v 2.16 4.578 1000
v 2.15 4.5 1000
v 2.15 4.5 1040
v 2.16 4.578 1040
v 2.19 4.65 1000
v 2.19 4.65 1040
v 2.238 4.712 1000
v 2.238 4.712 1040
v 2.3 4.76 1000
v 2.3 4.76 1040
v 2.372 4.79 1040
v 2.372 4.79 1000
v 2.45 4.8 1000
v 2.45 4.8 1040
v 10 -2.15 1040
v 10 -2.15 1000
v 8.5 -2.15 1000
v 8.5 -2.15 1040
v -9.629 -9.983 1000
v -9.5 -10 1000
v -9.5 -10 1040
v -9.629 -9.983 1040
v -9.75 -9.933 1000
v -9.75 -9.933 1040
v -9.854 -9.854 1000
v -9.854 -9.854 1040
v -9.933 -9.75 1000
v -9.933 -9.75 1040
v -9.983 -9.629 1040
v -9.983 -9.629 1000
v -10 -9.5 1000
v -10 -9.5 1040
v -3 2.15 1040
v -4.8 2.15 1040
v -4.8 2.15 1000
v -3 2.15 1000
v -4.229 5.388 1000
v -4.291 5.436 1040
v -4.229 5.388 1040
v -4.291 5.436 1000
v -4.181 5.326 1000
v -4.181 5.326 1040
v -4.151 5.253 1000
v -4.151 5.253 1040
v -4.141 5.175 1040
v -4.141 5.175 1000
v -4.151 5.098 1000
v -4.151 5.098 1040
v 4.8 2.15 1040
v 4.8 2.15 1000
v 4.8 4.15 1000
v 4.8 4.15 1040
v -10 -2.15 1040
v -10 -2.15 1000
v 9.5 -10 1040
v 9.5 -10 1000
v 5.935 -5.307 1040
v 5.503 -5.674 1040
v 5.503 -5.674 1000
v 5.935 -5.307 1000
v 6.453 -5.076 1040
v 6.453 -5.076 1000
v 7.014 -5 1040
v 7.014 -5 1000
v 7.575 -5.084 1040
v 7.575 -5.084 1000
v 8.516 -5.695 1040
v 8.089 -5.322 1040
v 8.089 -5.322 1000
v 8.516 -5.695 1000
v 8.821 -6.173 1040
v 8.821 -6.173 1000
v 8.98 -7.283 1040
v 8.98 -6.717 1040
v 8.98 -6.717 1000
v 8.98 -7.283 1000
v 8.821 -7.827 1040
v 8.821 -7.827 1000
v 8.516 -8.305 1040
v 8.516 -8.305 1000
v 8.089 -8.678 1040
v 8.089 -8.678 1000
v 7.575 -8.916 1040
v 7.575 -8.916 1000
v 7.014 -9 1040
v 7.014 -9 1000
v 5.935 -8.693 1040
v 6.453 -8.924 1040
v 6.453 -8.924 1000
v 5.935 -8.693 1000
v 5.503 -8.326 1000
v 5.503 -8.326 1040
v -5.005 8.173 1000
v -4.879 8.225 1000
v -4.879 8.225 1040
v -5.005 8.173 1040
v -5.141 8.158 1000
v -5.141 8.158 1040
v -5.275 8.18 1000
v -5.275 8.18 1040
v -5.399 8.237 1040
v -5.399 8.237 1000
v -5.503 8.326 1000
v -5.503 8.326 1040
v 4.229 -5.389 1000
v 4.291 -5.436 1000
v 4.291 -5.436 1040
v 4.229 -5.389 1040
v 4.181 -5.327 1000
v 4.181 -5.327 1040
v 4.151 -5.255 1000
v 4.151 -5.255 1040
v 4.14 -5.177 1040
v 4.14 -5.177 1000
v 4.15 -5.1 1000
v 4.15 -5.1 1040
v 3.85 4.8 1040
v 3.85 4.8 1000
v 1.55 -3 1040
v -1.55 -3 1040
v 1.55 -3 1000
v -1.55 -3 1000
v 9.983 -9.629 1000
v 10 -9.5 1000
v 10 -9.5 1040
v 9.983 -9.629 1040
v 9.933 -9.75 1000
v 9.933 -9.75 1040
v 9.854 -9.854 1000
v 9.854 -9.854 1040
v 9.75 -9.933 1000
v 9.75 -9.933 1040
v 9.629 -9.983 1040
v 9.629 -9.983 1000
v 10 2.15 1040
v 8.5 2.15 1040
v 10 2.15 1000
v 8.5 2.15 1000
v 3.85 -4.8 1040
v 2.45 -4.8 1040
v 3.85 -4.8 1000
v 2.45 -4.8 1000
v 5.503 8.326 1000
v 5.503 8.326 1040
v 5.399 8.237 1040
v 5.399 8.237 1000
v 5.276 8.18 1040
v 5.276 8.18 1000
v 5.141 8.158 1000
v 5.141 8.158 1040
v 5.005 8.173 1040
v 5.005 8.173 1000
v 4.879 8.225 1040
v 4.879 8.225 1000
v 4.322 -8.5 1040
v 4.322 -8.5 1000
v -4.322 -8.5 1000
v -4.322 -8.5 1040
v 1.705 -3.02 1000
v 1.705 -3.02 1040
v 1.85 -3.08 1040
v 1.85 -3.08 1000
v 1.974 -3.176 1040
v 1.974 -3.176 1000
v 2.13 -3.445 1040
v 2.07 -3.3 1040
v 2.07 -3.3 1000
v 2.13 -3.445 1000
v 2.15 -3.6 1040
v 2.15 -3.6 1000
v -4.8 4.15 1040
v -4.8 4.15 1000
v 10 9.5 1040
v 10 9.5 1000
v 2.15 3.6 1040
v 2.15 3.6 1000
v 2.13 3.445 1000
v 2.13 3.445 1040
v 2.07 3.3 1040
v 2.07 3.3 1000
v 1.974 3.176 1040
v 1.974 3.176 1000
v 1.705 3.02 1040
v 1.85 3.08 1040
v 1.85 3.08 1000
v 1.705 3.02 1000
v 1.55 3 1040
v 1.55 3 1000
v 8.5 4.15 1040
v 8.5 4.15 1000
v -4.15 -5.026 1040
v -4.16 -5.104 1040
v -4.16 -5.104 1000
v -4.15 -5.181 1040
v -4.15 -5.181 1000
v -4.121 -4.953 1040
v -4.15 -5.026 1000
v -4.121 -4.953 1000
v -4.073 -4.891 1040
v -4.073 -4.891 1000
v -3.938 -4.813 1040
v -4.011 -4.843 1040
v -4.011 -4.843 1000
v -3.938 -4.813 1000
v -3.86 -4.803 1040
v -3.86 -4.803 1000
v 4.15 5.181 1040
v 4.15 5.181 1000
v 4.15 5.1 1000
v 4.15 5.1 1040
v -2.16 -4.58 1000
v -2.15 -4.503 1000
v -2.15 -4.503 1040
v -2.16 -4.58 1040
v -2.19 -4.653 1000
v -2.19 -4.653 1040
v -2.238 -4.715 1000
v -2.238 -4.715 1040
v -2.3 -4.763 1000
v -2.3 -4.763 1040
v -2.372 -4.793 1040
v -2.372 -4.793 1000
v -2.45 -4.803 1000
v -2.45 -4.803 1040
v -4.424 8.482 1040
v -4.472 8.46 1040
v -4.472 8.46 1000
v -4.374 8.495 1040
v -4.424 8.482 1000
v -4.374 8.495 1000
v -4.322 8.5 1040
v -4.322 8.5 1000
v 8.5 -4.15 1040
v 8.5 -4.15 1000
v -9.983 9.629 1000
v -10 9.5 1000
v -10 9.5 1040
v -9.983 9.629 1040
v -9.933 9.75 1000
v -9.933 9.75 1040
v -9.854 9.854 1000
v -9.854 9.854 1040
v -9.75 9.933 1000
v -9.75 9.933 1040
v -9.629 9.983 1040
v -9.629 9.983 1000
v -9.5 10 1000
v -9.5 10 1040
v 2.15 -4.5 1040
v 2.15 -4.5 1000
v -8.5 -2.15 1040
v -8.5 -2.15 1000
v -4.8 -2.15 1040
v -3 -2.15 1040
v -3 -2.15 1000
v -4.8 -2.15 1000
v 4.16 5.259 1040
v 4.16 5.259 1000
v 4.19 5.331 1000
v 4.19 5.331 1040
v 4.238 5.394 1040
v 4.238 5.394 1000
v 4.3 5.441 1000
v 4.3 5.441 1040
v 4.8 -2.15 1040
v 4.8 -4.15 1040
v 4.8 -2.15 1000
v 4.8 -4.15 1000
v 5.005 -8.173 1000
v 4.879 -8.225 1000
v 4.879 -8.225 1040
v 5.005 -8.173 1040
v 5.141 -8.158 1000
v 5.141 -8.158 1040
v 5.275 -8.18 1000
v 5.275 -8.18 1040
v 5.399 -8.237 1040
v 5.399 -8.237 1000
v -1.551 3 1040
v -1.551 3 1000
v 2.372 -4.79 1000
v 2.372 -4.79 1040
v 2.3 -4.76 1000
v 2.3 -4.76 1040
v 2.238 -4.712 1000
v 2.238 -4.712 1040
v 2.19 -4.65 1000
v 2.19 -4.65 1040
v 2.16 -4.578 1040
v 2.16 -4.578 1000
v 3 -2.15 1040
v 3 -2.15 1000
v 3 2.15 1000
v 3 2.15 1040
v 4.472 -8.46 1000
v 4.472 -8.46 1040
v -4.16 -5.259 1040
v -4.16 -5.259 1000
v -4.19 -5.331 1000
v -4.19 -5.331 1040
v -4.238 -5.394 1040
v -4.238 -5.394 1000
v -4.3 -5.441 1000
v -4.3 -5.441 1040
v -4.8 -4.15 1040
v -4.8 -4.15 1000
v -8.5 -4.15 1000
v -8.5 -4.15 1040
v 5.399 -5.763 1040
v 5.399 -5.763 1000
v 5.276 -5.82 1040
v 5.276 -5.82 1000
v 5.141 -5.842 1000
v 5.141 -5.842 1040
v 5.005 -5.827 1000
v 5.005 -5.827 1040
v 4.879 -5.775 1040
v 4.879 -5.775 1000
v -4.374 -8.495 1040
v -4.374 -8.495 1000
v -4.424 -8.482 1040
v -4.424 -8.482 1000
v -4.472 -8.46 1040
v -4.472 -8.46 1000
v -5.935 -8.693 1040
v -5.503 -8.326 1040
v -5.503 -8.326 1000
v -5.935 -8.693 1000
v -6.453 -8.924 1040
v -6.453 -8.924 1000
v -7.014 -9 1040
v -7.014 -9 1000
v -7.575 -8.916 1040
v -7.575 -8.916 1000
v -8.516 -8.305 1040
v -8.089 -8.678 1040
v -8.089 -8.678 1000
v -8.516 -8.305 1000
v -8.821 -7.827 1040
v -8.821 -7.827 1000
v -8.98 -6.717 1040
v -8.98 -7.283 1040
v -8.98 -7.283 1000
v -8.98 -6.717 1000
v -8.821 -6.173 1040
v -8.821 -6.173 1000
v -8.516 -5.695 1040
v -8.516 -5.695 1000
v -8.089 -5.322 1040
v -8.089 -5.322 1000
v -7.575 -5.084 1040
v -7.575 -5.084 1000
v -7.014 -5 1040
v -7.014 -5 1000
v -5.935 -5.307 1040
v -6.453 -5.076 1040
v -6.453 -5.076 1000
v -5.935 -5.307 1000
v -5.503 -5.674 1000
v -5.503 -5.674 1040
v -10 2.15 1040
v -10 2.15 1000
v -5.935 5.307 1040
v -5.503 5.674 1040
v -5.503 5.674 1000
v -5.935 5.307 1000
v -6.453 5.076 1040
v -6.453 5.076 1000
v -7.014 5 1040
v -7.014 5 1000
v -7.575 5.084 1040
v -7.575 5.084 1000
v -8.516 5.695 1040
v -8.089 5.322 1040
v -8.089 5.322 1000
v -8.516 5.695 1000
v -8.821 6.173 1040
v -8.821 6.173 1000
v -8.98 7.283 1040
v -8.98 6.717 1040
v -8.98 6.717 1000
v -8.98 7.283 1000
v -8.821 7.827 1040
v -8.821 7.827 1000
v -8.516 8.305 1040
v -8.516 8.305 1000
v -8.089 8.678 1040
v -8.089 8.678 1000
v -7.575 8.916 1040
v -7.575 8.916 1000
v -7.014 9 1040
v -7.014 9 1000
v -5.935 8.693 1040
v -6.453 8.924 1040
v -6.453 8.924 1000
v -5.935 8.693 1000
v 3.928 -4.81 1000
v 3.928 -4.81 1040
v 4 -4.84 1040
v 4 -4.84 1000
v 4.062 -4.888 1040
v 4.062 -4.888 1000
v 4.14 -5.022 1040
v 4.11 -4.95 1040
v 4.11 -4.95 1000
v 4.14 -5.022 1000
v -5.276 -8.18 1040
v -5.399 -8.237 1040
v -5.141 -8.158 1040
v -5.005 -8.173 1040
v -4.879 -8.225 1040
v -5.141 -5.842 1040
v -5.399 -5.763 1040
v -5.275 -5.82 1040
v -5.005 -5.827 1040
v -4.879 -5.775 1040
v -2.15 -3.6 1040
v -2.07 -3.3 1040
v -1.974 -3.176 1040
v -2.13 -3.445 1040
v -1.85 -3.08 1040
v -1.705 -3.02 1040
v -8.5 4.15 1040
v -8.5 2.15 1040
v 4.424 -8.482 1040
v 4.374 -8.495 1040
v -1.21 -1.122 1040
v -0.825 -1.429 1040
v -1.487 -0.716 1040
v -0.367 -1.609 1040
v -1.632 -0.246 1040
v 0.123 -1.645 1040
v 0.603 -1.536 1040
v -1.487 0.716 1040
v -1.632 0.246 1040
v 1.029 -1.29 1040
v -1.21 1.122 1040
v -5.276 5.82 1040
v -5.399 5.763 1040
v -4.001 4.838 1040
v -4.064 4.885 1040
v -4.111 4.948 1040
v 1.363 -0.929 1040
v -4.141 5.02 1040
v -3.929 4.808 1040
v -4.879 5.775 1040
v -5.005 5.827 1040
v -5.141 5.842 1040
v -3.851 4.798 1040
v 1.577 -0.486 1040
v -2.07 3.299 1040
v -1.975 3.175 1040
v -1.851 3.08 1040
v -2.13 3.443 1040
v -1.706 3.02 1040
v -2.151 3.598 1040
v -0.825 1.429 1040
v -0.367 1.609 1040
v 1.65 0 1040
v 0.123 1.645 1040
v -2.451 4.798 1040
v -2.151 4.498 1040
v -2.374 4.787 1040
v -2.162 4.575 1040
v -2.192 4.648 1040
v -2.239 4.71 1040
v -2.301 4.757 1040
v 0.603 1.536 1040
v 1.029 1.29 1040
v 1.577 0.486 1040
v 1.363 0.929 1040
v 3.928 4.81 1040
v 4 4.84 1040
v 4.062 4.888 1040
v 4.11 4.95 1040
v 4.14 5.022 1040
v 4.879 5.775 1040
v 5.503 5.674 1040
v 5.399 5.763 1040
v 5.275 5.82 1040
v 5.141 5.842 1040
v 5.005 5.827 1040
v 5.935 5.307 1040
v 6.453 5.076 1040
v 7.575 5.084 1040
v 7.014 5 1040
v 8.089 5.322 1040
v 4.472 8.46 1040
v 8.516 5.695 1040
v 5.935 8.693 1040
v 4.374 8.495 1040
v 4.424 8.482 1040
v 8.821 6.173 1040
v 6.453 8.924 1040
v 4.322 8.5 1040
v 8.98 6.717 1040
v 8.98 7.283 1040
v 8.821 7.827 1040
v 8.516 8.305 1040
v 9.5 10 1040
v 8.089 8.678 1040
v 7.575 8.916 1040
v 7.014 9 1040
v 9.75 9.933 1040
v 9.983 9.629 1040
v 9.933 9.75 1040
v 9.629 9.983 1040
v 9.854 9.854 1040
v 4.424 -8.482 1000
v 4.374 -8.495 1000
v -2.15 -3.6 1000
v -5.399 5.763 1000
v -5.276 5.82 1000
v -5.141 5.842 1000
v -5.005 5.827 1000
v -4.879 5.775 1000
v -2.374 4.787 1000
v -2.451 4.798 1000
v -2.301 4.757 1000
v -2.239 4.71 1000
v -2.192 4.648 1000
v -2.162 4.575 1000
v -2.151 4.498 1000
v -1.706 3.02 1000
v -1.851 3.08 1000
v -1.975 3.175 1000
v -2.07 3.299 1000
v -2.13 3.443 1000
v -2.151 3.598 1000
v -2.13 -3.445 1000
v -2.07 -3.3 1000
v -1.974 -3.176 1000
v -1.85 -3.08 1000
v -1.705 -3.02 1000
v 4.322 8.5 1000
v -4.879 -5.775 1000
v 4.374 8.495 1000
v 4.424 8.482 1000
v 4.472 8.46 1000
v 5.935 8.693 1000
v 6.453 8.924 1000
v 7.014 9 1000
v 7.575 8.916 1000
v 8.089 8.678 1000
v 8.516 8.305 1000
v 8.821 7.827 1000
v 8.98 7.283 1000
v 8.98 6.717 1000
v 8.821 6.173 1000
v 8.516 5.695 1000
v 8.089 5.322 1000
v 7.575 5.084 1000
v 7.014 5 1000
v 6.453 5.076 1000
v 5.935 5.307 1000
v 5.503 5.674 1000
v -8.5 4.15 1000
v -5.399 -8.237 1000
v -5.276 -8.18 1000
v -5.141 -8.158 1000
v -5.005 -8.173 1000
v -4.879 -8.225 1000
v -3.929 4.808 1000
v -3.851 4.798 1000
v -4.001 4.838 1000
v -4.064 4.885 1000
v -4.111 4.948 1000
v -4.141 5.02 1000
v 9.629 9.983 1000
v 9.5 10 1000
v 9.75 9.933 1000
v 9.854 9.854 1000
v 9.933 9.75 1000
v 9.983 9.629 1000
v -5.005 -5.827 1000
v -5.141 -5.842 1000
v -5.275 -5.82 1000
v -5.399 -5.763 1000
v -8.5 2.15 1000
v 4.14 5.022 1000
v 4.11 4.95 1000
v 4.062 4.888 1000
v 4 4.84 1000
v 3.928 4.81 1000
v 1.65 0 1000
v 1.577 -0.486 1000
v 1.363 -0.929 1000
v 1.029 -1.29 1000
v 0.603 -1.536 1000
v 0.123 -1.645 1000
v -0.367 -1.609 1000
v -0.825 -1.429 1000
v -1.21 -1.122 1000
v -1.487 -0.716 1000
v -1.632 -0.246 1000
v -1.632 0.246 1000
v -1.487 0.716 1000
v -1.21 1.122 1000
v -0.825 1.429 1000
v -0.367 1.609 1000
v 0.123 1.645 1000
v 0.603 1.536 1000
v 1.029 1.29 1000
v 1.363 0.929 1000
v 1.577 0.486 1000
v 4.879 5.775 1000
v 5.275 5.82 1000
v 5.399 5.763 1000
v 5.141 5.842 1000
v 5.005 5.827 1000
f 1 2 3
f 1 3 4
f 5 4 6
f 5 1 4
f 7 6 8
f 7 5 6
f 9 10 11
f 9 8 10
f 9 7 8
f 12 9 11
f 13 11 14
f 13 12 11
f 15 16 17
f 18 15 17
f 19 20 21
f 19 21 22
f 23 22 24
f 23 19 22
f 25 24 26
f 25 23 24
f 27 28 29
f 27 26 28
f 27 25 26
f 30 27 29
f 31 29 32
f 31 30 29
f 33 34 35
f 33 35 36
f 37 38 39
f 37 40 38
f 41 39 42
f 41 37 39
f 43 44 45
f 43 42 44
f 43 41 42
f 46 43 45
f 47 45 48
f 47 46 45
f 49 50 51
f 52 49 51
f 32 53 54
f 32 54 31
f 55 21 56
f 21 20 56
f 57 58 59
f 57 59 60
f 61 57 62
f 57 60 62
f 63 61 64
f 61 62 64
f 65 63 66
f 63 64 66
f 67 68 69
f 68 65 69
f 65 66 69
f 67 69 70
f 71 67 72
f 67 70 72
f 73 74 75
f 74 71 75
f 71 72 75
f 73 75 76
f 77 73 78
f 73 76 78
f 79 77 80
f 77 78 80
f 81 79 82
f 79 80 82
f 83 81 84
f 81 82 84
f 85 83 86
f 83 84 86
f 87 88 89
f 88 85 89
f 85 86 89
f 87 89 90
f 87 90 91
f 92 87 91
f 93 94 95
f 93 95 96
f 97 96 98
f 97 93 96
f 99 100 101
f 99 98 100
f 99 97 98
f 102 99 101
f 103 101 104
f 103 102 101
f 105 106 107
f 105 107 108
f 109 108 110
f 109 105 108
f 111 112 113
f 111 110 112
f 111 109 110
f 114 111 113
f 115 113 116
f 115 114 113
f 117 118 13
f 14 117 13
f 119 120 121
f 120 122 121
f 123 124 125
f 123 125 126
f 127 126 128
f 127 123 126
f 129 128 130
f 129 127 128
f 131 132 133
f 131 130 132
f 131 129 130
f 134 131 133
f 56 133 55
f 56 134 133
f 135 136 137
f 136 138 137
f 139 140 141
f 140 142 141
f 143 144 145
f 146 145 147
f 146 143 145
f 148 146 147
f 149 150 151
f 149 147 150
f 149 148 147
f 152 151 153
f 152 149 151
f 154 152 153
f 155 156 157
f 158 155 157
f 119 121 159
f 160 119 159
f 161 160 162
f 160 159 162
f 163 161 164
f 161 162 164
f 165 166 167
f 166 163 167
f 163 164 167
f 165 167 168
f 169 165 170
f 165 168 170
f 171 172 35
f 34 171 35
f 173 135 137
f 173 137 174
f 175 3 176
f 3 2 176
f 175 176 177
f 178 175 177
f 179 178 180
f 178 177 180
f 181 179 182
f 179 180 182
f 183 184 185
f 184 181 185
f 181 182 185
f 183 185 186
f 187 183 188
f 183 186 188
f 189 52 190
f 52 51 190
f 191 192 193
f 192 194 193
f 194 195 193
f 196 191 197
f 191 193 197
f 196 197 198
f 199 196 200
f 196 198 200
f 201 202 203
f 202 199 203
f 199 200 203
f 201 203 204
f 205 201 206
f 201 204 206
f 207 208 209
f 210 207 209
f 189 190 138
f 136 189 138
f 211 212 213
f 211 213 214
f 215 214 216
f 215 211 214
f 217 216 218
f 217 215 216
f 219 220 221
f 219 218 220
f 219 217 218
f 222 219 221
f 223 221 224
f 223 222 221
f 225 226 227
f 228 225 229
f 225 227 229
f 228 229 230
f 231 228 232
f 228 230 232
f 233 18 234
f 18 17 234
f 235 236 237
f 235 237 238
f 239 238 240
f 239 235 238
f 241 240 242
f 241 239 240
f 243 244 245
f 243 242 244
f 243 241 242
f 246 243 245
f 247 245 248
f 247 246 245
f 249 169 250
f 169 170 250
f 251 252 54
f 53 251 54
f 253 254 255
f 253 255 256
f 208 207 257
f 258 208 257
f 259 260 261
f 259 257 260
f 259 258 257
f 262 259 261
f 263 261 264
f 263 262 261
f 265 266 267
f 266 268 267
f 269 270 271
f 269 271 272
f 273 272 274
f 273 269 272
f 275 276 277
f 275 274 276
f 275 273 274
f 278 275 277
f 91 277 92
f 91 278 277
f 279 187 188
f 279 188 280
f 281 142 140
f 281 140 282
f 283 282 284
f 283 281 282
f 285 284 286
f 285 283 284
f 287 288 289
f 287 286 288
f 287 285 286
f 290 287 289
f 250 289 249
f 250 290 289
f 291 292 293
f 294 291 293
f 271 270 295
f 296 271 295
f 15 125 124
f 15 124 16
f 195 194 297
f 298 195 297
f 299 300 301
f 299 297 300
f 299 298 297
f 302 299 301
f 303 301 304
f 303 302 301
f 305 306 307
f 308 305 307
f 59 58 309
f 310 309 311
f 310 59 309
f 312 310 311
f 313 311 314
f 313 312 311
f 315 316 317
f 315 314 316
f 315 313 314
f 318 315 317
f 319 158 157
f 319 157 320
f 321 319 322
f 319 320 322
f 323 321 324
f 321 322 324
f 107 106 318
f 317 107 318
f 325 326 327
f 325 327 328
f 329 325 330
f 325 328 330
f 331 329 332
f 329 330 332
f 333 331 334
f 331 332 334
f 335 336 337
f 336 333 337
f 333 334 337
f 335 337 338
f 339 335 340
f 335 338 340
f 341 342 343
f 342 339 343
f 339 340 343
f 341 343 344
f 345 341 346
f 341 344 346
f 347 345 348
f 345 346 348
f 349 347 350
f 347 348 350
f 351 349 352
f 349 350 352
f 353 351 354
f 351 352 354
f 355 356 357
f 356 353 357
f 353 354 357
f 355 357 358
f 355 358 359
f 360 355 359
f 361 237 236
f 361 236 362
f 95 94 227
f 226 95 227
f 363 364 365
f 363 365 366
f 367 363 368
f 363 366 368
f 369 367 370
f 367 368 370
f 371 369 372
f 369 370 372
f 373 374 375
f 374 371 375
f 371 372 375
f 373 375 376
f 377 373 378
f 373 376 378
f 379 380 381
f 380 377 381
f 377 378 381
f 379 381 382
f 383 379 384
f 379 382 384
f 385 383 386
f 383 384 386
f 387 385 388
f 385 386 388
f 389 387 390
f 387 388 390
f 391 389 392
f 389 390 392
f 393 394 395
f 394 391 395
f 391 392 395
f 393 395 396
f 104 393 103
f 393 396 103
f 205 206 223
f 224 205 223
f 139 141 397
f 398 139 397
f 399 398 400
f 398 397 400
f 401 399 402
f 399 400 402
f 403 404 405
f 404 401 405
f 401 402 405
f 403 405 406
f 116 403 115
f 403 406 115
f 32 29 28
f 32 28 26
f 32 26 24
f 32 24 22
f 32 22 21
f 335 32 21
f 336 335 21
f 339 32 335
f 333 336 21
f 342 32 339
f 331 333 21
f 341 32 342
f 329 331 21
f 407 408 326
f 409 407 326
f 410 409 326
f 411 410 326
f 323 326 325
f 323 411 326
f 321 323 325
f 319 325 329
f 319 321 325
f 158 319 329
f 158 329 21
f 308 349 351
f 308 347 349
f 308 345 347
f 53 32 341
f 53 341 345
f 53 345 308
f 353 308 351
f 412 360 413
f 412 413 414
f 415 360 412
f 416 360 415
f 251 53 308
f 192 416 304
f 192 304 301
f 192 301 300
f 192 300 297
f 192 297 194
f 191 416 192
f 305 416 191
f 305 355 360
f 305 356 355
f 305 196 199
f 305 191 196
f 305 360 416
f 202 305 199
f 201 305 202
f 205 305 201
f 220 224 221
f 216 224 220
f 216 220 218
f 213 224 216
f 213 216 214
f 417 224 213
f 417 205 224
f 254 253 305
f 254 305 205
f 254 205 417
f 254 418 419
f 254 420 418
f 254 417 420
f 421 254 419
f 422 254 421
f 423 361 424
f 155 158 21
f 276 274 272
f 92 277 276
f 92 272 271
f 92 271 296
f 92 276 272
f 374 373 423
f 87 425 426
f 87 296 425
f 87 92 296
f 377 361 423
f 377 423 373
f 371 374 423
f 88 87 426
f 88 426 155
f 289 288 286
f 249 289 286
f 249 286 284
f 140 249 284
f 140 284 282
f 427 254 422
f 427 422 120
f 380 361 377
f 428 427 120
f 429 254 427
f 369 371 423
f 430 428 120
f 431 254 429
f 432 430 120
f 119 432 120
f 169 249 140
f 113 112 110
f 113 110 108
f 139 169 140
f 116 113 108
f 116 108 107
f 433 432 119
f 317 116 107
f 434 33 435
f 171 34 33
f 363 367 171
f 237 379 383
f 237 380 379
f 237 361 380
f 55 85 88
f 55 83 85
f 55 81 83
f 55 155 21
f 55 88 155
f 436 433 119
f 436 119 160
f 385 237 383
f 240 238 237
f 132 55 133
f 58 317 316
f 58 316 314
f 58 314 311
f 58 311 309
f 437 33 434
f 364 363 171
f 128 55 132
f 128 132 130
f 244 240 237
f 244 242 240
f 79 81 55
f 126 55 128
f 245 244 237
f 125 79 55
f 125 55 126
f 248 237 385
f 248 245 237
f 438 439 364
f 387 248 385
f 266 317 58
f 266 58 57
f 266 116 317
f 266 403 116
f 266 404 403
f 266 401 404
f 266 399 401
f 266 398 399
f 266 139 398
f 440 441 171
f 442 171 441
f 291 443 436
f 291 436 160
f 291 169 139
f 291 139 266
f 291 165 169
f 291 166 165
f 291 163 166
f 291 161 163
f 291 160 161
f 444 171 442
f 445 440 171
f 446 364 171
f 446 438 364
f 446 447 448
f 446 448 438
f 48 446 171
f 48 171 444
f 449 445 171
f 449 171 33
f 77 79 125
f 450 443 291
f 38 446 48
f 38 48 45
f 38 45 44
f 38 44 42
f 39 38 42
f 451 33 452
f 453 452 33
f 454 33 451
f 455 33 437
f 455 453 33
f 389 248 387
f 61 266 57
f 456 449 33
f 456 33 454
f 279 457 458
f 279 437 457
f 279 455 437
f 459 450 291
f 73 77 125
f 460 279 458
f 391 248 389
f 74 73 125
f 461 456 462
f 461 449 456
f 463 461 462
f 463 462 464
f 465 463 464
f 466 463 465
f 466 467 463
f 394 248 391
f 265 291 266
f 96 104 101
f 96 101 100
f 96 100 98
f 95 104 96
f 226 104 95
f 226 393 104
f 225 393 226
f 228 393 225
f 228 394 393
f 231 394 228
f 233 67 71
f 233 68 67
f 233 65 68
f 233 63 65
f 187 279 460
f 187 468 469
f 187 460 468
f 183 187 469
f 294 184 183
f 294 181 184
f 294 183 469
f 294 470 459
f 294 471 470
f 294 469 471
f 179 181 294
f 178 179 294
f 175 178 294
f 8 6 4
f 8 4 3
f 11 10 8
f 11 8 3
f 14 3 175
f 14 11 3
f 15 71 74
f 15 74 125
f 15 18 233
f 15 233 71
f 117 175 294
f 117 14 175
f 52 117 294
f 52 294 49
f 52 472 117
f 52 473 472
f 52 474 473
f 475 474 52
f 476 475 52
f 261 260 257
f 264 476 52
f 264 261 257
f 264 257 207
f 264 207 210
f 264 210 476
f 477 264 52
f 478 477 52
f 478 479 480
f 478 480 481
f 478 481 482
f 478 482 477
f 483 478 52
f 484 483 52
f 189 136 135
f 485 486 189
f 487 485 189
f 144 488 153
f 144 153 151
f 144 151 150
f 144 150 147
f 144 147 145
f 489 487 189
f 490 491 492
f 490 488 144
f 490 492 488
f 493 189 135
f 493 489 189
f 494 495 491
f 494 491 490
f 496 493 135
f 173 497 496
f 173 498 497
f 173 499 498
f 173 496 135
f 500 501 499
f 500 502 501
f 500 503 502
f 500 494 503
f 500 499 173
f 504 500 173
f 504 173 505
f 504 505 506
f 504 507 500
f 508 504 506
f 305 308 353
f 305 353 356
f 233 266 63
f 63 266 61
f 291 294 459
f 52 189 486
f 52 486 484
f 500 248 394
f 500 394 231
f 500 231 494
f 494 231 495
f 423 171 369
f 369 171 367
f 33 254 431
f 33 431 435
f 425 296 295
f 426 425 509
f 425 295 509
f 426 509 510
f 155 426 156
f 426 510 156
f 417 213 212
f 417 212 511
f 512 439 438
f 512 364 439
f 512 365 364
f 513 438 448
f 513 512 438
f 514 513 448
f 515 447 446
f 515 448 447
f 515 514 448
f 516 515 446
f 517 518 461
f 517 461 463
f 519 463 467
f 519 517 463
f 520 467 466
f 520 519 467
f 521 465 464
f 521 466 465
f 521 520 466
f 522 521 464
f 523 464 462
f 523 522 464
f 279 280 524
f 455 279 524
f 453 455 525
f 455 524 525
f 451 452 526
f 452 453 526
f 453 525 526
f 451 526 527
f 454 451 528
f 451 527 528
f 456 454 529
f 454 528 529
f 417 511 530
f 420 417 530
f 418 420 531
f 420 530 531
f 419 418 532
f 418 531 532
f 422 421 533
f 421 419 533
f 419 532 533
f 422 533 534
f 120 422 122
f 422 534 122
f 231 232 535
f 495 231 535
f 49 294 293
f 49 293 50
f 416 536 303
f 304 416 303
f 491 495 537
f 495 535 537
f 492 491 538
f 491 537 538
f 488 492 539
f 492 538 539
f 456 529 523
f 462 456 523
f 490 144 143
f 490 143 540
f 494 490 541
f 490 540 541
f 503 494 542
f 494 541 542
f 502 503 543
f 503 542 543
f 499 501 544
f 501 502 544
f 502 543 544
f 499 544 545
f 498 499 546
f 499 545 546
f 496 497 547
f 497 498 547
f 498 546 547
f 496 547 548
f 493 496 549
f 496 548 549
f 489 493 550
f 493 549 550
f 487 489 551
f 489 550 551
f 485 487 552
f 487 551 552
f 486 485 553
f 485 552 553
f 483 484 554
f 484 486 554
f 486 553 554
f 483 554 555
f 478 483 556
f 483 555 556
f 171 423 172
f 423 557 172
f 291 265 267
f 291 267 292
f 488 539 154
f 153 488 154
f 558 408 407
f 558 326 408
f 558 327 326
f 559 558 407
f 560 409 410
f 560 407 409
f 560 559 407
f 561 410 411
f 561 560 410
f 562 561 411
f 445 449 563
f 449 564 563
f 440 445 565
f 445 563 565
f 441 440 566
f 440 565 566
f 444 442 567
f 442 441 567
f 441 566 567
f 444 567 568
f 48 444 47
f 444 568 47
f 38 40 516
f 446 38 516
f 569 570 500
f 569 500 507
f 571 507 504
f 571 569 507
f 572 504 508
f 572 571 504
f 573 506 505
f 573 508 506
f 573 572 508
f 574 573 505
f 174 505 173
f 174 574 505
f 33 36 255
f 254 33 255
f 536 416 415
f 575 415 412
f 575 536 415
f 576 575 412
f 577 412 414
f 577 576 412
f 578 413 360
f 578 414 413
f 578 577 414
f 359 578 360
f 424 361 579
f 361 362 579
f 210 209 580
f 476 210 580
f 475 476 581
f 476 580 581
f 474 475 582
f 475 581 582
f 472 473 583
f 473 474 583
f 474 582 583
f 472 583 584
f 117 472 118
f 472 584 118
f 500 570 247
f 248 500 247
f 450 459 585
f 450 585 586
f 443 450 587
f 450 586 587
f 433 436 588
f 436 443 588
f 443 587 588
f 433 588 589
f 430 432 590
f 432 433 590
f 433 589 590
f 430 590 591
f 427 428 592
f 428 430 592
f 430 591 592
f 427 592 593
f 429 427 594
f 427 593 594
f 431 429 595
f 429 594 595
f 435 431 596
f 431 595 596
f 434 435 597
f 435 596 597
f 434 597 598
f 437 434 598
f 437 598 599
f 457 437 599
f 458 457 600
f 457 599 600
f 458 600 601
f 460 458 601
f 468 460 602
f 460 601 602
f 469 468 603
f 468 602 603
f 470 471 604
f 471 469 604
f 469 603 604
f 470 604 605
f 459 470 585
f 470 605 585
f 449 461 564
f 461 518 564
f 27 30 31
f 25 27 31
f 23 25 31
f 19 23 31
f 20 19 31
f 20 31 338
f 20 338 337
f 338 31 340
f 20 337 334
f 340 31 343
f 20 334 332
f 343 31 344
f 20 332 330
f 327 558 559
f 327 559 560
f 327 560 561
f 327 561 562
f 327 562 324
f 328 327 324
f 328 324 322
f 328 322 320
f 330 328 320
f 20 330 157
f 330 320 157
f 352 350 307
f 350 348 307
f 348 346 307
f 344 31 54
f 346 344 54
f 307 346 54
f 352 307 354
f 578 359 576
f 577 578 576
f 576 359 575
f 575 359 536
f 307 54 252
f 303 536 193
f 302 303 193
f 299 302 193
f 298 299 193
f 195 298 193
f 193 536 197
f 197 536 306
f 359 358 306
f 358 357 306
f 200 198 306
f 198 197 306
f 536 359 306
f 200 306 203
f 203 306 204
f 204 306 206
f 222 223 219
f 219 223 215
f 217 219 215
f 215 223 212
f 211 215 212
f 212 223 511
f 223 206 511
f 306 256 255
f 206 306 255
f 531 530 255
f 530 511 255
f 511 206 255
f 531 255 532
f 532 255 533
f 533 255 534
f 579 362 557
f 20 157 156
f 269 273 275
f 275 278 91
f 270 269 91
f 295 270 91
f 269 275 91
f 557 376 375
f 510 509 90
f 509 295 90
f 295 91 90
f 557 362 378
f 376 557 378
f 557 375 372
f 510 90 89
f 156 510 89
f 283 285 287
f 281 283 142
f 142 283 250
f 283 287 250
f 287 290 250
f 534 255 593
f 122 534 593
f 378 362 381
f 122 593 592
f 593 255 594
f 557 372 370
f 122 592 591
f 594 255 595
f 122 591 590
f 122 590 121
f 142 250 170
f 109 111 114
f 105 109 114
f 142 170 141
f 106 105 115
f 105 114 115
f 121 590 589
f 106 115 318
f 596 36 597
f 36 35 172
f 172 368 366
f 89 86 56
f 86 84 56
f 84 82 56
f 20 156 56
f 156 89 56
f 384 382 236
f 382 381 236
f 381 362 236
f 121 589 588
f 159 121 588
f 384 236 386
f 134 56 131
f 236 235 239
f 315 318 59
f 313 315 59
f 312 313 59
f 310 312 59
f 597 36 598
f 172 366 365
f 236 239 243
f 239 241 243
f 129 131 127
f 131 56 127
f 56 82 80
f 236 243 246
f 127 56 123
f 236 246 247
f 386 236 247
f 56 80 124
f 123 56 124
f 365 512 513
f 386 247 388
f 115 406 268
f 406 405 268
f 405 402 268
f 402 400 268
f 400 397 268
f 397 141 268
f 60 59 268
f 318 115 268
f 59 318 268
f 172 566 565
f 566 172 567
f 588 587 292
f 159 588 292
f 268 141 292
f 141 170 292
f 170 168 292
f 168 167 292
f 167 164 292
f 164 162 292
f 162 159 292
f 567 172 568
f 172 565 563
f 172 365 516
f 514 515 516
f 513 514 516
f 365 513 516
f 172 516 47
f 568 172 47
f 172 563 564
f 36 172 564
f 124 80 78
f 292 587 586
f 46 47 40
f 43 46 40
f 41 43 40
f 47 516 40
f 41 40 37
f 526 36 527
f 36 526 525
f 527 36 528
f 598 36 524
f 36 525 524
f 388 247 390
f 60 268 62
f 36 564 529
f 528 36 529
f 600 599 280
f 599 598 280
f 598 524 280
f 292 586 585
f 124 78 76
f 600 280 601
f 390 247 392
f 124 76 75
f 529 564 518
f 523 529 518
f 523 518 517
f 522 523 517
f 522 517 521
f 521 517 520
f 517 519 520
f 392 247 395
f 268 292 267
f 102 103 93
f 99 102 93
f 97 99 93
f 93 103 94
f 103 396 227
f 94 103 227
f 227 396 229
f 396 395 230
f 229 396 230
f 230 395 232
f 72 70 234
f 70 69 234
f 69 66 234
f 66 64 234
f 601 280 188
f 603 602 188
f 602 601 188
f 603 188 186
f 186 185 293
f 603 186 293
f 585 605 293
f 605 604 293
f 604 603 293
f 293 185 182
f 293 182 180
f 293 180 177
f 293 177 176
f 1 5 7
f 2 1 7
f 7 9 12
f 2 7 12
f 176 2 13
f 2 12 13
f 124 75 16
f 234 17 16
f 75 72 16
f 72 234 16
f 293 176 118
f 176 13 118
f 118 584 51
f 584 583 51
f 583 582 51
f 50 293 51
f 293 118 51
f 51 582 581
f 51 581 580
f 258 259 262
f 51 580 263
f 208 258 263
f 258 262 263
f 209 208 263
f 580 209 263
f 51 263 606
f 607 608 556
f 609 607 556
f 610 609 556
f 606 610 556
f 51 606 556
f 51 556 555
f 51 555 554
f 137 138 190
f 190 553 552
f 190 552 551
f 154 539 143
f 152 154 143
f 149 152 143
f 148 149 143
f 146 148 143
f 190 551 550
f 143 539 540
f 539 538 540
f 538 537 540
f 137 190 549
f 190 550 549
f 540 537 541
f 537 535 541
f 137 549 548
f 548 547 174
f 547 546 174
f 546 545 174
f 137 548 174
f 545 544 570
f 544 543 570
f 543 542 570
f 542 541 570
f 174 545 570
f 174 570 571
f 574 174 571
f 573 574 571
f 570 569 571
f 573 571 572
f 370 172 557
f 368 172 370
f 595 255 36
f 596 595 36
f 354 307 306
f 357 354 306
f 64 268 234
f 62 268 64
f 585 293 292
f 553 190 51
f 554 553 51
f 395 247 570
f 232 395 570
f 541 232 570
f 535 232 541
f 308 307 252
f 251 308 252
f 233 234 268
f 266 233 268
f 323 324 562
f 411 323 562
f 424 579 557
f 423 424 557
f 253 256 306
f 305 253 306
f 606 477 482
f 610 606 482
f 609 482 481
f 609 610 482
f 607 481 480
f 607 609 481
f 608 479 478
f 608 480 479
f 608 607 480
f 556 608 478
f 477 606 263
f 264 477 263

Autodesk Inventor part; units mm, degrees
ref_plane "YZ Plane" through (0, 0, 0) normal (1, 0, 0) x (0, 1, 0)
ref_plane "XZ Plane" through (0, 0, 0) normal (0, 1, 0) x (-1, 0, 0)
ref_plane "作業平面1" through (-9.5, -10, 1000) normal (0, 0, 1) x (1, 0, 0)
sketch "スケッチ1" plane through (-9.5, -10, 1000) normal (0, 0, 1) x (1, 0, 0)
  line L0 (-0.5, 12.15) -> (1, 12.15) projected
  line L1 (1, 12.15) -> (1, 14.15) projected
  line L2 (1, 14.15) -> (4.7, 14.15) projected
  line L3 (4.7, 14.15) -> (4.7, 12.15) projected
  line L4 (4.7, 12.15) -> (6.5, 12.15) projected
  line L5 (6.5, 12.15) -> (6.5, 7.85) projected
  line L6 (6.5, 7.85) -> (4.7, 7.85) projected
  line L7 (4.7, 7.85) -> (4.7, 5.85) projected
  line L8 (4.7, 5.85) -> (1, 5.85) projected
  line L9 (1, 5.85) -> (1, 7.85) projected
  line L10 (1, 7.85) -> (-0.5, 7.85) projected
  line L11 (-0.5, 7.85) -> (-0.5, 0.5) projected
  arc A0 (-0.5, 0.5) -> (0, 0) centre (0, 0.5) ccw projected
  line L12 (0, 0) -> (19, 0) projected
  arc A1 (19, 0) -> (19.5, 0.5) centre (19, 0.5) ccw projected
  line L13 (19.5, 0.5) -> (19.5, 7.85) projected
  line L14 (19.5, 7.85) -> (18, 7.85) projected
  line L15 (18, 7.85) -> (18, 5.85) projected
  line L16 (18, 5.85) -> (14.3, 5.85) projected
  line L17 (14.3, 5.85) -> (14.3, 7.85) projected
  line L18 (14.3, 7.85) -> (12.5, 7.85) projected
  line L19 (12.5, 7.85) -> (12.5, 12.15) projected
  line L20 (12.5, 12.15) -> (14.3, 12.15) projected
  line L21 (14.3, 12.15) -> (14.3, 14.15) projected
  line L22 (14.3, 14.15) -> (18, 14.15) projected
  line L23 (18, 14.15) -> (18, 12.15) projected
  line L24 (18, 12.15) -> (19.5, 12.15) projected
  line L25 (19.5, 12.15) -> (19.5, 19.5) projected
  arc A2 (19.5, 19.5) -> (19, 20) centre (19, 19.5) ccw projected
  line L26 (19, 20) -> (0, 20) projected
  arc A3 (0, 20) -> (-0.5, 19.5) centre (0, 19.5) ccw projected
  line L27 (-0.5, 19.5) -> (-0.5, 12.15) projected
  line L28 (13.65, 15.1813) -> (13.65, 15.1) projected
  arc A4 (13.35, 14.8) -> (13.65, 15.1) centre (13.35, 15.1) ccw projected
  line L29 (13.35, 14.8) -> (11.95, 14.8) projected
  arc A5 (11.95, 14.8) -> (11.65, 14.5) centre (11.95, 14.5) ccw projected
  line L30 (11.65, 14.5) -> (11.65, 13.6) projected
  arc A6 (11.05, 13) -> (11.65, 13.6) centre (11.05, 13.6) ccw projected
  line L31 (11.05, 13) -> (7.9486, 13) projected
  arc A7 (7.3486, 13.5976) -> (7.9486, 13) centre (7.9486, 13.6) ccw projected
  line L32 (7.3486, 13.5976) -> (7.3486, 14.4976) projected
  arc A8 (7.3486, 14.4976) -> (7.0486, 14.7976) centre (7.0486, 14.4976) ccw projected
  line L33 (7.0486, 14.7976) -> (5.6486, 14.7976) projected
  arc A9 (5.3486, 15.0976) -> (5.6486, 14.7976) centre (5.6486, 15.0976) ccw projected
  arc A10 (5.3486, 15.0976) -> (5.2091, 15.4359) centre (5.0591, 15.1761) ccw projected
  line L34 (5.2091, 15.4359) -> (4.6213, 15.7753) projected
  arc A11 (4.6213, 15.7753) -> (3.9971, 15.6738) centre (4.3713, 15.3422) ccw projected
  arc A12 (3.9971, 18.3262) -> (3.9971, 15.6738) centre (2.5, 17) ccw projected
  arc A13 (3.9971, 18.3262) -> (4.6213, 18.2247) centre (4.3713, 18.6578) ccw projected
  line L35 (4.6213, 18.2247) -> (5.0285, 18.4598) projected
  arc A14 (5.1785, 18.5) -> (5.0285, 18.4598) centre (5.1785, 18.2) ccw projected
  line L36 (5.1785, 18.5) -> (13.8215, 18.5) projected
  arc A15 (13.9715, 18.4598) -> (13.8215, 18.5) centre (13.8215, 18.2) ccw projected
  line L37 (13.9715, 18.4598) -> (14.3787, 18.2247) projected
  arc A16 (14.3787, 18.2247) -> (15.0029, 18.3262) centre (14.6287, 18.6578) ccw projected
  arc A17 (15.0029, 15.6738) -> (15.0029, 18.3262) centre (16.5, 17) ccw projected
  arc A18 (15.0029, 15.6738) -> (14.3787, 15.7753) centre (14.6287, 15.3422) ccw projected
  line L38 (14.3787, 15.7753) -> (13.8, 15.4412) projected
  arc A19 (13.8, 15.4412) -> (13.65, 15.1813) centre (13.95, 15.1813) ccw projected
  arc A20 (11.65, 6.4) -> (11.05, 7) centre (11.05, 6.4) ccw projected
  line L39 (11.65, 6.4) -> (11.65, 5.5) projected
  arc A21 (11.65, 5.5) -> (11.95, 5.2) centre (11.95, 5.5) ccw projected
  line L40 (11.95, 5.2) -> (13.35, 5.2) projected
  arc A22 (13.65, 4.9) -> (13.35, 5.2) centre (13.35, 4.9) ccw projected
  arc A23 (13.65, 4.9) -> (13.7909, 4.5641) centre (13.9403, 4.8243) ccw projected
  line L41 (13.7909, 4.5641) -> (14.3787, 4.2247) projected
  arc A24 (14.3787, 4.2247) -> (15.0029, 4.3262) centre (14.6287, 4.6578) ccw projected
  arc A25 (15.0029, 1.6738) -> (15.0029, 4.3262) centre (16.5, 3) ccw projected
  arc A26 (15.0029, 1.6738) -> (14.3787, 1.7753) centre (14.6287, 1.3422) ccw projected
  line L42 (14.3787, 1.7753) -> (13.9715, 1.5402) projected
  arc A27 (13.8215, 1.5) -> (13.9715, 1.5402) centre (13.8215, 1.8) ccw projected
  line L43 (13.8215, 1.5) -> (5.1785, 1.5) projected
  arc A28 (5.0285, 1.5402) -> (5.1785, 1.5) centre (5.1785, 1.8) ccw projected
  line L44 (5.0285, 1.5402) -> (4.6213, 1.7753) projected
  arc A29 (4.6213, 1.7753) -> (3.9971, 1.6738) centre (4.3713, 1.3422) ccw projected
  arc A30 (3.9971, 4.3262) -> (3.9971, 1.6738) centre (2.5, 3) ccw projected
  arc A31 (3.9971, 4.3262) -> (4.6213, 4.2247) centre (4.3713, 4.6578) ccw projected
  line L45 (4.6213, 4.2247) -> (5.2, 4.5588) projected
  arc A32 (5.2, 4.5588) -> (5.35, 4.8187) centre (5.05, 4.8187) ccw projected
  arc A33 (5.6395, 5.1972) -> (5.35, 4.8187) centre (5.6395, 4.8972) ccw projected
  line L46 (5.6395, 5.1972) -> (7.05, 5.1972) projected
  arc A34 (7.05, 5.1972) -> (7.35, 5.4972) centre (7.05, 5.4972) ccw projected
  line L47 (7.35, 5.4972) -> (7.35, 6.4) projected
  arc A35 (7.95, 7) -> (7.35, 6.4) centre (7.95, 6.4) ccw projected
  line L48 (7.95, 7) -> (11.05, 7) projected
  circle A36 centre (9.5, 10) radius 1.65 projected
extrude "押し出し1" add sketch "スケッチ1" along normal blind 40
properties part number "AFSW-2020-4"
